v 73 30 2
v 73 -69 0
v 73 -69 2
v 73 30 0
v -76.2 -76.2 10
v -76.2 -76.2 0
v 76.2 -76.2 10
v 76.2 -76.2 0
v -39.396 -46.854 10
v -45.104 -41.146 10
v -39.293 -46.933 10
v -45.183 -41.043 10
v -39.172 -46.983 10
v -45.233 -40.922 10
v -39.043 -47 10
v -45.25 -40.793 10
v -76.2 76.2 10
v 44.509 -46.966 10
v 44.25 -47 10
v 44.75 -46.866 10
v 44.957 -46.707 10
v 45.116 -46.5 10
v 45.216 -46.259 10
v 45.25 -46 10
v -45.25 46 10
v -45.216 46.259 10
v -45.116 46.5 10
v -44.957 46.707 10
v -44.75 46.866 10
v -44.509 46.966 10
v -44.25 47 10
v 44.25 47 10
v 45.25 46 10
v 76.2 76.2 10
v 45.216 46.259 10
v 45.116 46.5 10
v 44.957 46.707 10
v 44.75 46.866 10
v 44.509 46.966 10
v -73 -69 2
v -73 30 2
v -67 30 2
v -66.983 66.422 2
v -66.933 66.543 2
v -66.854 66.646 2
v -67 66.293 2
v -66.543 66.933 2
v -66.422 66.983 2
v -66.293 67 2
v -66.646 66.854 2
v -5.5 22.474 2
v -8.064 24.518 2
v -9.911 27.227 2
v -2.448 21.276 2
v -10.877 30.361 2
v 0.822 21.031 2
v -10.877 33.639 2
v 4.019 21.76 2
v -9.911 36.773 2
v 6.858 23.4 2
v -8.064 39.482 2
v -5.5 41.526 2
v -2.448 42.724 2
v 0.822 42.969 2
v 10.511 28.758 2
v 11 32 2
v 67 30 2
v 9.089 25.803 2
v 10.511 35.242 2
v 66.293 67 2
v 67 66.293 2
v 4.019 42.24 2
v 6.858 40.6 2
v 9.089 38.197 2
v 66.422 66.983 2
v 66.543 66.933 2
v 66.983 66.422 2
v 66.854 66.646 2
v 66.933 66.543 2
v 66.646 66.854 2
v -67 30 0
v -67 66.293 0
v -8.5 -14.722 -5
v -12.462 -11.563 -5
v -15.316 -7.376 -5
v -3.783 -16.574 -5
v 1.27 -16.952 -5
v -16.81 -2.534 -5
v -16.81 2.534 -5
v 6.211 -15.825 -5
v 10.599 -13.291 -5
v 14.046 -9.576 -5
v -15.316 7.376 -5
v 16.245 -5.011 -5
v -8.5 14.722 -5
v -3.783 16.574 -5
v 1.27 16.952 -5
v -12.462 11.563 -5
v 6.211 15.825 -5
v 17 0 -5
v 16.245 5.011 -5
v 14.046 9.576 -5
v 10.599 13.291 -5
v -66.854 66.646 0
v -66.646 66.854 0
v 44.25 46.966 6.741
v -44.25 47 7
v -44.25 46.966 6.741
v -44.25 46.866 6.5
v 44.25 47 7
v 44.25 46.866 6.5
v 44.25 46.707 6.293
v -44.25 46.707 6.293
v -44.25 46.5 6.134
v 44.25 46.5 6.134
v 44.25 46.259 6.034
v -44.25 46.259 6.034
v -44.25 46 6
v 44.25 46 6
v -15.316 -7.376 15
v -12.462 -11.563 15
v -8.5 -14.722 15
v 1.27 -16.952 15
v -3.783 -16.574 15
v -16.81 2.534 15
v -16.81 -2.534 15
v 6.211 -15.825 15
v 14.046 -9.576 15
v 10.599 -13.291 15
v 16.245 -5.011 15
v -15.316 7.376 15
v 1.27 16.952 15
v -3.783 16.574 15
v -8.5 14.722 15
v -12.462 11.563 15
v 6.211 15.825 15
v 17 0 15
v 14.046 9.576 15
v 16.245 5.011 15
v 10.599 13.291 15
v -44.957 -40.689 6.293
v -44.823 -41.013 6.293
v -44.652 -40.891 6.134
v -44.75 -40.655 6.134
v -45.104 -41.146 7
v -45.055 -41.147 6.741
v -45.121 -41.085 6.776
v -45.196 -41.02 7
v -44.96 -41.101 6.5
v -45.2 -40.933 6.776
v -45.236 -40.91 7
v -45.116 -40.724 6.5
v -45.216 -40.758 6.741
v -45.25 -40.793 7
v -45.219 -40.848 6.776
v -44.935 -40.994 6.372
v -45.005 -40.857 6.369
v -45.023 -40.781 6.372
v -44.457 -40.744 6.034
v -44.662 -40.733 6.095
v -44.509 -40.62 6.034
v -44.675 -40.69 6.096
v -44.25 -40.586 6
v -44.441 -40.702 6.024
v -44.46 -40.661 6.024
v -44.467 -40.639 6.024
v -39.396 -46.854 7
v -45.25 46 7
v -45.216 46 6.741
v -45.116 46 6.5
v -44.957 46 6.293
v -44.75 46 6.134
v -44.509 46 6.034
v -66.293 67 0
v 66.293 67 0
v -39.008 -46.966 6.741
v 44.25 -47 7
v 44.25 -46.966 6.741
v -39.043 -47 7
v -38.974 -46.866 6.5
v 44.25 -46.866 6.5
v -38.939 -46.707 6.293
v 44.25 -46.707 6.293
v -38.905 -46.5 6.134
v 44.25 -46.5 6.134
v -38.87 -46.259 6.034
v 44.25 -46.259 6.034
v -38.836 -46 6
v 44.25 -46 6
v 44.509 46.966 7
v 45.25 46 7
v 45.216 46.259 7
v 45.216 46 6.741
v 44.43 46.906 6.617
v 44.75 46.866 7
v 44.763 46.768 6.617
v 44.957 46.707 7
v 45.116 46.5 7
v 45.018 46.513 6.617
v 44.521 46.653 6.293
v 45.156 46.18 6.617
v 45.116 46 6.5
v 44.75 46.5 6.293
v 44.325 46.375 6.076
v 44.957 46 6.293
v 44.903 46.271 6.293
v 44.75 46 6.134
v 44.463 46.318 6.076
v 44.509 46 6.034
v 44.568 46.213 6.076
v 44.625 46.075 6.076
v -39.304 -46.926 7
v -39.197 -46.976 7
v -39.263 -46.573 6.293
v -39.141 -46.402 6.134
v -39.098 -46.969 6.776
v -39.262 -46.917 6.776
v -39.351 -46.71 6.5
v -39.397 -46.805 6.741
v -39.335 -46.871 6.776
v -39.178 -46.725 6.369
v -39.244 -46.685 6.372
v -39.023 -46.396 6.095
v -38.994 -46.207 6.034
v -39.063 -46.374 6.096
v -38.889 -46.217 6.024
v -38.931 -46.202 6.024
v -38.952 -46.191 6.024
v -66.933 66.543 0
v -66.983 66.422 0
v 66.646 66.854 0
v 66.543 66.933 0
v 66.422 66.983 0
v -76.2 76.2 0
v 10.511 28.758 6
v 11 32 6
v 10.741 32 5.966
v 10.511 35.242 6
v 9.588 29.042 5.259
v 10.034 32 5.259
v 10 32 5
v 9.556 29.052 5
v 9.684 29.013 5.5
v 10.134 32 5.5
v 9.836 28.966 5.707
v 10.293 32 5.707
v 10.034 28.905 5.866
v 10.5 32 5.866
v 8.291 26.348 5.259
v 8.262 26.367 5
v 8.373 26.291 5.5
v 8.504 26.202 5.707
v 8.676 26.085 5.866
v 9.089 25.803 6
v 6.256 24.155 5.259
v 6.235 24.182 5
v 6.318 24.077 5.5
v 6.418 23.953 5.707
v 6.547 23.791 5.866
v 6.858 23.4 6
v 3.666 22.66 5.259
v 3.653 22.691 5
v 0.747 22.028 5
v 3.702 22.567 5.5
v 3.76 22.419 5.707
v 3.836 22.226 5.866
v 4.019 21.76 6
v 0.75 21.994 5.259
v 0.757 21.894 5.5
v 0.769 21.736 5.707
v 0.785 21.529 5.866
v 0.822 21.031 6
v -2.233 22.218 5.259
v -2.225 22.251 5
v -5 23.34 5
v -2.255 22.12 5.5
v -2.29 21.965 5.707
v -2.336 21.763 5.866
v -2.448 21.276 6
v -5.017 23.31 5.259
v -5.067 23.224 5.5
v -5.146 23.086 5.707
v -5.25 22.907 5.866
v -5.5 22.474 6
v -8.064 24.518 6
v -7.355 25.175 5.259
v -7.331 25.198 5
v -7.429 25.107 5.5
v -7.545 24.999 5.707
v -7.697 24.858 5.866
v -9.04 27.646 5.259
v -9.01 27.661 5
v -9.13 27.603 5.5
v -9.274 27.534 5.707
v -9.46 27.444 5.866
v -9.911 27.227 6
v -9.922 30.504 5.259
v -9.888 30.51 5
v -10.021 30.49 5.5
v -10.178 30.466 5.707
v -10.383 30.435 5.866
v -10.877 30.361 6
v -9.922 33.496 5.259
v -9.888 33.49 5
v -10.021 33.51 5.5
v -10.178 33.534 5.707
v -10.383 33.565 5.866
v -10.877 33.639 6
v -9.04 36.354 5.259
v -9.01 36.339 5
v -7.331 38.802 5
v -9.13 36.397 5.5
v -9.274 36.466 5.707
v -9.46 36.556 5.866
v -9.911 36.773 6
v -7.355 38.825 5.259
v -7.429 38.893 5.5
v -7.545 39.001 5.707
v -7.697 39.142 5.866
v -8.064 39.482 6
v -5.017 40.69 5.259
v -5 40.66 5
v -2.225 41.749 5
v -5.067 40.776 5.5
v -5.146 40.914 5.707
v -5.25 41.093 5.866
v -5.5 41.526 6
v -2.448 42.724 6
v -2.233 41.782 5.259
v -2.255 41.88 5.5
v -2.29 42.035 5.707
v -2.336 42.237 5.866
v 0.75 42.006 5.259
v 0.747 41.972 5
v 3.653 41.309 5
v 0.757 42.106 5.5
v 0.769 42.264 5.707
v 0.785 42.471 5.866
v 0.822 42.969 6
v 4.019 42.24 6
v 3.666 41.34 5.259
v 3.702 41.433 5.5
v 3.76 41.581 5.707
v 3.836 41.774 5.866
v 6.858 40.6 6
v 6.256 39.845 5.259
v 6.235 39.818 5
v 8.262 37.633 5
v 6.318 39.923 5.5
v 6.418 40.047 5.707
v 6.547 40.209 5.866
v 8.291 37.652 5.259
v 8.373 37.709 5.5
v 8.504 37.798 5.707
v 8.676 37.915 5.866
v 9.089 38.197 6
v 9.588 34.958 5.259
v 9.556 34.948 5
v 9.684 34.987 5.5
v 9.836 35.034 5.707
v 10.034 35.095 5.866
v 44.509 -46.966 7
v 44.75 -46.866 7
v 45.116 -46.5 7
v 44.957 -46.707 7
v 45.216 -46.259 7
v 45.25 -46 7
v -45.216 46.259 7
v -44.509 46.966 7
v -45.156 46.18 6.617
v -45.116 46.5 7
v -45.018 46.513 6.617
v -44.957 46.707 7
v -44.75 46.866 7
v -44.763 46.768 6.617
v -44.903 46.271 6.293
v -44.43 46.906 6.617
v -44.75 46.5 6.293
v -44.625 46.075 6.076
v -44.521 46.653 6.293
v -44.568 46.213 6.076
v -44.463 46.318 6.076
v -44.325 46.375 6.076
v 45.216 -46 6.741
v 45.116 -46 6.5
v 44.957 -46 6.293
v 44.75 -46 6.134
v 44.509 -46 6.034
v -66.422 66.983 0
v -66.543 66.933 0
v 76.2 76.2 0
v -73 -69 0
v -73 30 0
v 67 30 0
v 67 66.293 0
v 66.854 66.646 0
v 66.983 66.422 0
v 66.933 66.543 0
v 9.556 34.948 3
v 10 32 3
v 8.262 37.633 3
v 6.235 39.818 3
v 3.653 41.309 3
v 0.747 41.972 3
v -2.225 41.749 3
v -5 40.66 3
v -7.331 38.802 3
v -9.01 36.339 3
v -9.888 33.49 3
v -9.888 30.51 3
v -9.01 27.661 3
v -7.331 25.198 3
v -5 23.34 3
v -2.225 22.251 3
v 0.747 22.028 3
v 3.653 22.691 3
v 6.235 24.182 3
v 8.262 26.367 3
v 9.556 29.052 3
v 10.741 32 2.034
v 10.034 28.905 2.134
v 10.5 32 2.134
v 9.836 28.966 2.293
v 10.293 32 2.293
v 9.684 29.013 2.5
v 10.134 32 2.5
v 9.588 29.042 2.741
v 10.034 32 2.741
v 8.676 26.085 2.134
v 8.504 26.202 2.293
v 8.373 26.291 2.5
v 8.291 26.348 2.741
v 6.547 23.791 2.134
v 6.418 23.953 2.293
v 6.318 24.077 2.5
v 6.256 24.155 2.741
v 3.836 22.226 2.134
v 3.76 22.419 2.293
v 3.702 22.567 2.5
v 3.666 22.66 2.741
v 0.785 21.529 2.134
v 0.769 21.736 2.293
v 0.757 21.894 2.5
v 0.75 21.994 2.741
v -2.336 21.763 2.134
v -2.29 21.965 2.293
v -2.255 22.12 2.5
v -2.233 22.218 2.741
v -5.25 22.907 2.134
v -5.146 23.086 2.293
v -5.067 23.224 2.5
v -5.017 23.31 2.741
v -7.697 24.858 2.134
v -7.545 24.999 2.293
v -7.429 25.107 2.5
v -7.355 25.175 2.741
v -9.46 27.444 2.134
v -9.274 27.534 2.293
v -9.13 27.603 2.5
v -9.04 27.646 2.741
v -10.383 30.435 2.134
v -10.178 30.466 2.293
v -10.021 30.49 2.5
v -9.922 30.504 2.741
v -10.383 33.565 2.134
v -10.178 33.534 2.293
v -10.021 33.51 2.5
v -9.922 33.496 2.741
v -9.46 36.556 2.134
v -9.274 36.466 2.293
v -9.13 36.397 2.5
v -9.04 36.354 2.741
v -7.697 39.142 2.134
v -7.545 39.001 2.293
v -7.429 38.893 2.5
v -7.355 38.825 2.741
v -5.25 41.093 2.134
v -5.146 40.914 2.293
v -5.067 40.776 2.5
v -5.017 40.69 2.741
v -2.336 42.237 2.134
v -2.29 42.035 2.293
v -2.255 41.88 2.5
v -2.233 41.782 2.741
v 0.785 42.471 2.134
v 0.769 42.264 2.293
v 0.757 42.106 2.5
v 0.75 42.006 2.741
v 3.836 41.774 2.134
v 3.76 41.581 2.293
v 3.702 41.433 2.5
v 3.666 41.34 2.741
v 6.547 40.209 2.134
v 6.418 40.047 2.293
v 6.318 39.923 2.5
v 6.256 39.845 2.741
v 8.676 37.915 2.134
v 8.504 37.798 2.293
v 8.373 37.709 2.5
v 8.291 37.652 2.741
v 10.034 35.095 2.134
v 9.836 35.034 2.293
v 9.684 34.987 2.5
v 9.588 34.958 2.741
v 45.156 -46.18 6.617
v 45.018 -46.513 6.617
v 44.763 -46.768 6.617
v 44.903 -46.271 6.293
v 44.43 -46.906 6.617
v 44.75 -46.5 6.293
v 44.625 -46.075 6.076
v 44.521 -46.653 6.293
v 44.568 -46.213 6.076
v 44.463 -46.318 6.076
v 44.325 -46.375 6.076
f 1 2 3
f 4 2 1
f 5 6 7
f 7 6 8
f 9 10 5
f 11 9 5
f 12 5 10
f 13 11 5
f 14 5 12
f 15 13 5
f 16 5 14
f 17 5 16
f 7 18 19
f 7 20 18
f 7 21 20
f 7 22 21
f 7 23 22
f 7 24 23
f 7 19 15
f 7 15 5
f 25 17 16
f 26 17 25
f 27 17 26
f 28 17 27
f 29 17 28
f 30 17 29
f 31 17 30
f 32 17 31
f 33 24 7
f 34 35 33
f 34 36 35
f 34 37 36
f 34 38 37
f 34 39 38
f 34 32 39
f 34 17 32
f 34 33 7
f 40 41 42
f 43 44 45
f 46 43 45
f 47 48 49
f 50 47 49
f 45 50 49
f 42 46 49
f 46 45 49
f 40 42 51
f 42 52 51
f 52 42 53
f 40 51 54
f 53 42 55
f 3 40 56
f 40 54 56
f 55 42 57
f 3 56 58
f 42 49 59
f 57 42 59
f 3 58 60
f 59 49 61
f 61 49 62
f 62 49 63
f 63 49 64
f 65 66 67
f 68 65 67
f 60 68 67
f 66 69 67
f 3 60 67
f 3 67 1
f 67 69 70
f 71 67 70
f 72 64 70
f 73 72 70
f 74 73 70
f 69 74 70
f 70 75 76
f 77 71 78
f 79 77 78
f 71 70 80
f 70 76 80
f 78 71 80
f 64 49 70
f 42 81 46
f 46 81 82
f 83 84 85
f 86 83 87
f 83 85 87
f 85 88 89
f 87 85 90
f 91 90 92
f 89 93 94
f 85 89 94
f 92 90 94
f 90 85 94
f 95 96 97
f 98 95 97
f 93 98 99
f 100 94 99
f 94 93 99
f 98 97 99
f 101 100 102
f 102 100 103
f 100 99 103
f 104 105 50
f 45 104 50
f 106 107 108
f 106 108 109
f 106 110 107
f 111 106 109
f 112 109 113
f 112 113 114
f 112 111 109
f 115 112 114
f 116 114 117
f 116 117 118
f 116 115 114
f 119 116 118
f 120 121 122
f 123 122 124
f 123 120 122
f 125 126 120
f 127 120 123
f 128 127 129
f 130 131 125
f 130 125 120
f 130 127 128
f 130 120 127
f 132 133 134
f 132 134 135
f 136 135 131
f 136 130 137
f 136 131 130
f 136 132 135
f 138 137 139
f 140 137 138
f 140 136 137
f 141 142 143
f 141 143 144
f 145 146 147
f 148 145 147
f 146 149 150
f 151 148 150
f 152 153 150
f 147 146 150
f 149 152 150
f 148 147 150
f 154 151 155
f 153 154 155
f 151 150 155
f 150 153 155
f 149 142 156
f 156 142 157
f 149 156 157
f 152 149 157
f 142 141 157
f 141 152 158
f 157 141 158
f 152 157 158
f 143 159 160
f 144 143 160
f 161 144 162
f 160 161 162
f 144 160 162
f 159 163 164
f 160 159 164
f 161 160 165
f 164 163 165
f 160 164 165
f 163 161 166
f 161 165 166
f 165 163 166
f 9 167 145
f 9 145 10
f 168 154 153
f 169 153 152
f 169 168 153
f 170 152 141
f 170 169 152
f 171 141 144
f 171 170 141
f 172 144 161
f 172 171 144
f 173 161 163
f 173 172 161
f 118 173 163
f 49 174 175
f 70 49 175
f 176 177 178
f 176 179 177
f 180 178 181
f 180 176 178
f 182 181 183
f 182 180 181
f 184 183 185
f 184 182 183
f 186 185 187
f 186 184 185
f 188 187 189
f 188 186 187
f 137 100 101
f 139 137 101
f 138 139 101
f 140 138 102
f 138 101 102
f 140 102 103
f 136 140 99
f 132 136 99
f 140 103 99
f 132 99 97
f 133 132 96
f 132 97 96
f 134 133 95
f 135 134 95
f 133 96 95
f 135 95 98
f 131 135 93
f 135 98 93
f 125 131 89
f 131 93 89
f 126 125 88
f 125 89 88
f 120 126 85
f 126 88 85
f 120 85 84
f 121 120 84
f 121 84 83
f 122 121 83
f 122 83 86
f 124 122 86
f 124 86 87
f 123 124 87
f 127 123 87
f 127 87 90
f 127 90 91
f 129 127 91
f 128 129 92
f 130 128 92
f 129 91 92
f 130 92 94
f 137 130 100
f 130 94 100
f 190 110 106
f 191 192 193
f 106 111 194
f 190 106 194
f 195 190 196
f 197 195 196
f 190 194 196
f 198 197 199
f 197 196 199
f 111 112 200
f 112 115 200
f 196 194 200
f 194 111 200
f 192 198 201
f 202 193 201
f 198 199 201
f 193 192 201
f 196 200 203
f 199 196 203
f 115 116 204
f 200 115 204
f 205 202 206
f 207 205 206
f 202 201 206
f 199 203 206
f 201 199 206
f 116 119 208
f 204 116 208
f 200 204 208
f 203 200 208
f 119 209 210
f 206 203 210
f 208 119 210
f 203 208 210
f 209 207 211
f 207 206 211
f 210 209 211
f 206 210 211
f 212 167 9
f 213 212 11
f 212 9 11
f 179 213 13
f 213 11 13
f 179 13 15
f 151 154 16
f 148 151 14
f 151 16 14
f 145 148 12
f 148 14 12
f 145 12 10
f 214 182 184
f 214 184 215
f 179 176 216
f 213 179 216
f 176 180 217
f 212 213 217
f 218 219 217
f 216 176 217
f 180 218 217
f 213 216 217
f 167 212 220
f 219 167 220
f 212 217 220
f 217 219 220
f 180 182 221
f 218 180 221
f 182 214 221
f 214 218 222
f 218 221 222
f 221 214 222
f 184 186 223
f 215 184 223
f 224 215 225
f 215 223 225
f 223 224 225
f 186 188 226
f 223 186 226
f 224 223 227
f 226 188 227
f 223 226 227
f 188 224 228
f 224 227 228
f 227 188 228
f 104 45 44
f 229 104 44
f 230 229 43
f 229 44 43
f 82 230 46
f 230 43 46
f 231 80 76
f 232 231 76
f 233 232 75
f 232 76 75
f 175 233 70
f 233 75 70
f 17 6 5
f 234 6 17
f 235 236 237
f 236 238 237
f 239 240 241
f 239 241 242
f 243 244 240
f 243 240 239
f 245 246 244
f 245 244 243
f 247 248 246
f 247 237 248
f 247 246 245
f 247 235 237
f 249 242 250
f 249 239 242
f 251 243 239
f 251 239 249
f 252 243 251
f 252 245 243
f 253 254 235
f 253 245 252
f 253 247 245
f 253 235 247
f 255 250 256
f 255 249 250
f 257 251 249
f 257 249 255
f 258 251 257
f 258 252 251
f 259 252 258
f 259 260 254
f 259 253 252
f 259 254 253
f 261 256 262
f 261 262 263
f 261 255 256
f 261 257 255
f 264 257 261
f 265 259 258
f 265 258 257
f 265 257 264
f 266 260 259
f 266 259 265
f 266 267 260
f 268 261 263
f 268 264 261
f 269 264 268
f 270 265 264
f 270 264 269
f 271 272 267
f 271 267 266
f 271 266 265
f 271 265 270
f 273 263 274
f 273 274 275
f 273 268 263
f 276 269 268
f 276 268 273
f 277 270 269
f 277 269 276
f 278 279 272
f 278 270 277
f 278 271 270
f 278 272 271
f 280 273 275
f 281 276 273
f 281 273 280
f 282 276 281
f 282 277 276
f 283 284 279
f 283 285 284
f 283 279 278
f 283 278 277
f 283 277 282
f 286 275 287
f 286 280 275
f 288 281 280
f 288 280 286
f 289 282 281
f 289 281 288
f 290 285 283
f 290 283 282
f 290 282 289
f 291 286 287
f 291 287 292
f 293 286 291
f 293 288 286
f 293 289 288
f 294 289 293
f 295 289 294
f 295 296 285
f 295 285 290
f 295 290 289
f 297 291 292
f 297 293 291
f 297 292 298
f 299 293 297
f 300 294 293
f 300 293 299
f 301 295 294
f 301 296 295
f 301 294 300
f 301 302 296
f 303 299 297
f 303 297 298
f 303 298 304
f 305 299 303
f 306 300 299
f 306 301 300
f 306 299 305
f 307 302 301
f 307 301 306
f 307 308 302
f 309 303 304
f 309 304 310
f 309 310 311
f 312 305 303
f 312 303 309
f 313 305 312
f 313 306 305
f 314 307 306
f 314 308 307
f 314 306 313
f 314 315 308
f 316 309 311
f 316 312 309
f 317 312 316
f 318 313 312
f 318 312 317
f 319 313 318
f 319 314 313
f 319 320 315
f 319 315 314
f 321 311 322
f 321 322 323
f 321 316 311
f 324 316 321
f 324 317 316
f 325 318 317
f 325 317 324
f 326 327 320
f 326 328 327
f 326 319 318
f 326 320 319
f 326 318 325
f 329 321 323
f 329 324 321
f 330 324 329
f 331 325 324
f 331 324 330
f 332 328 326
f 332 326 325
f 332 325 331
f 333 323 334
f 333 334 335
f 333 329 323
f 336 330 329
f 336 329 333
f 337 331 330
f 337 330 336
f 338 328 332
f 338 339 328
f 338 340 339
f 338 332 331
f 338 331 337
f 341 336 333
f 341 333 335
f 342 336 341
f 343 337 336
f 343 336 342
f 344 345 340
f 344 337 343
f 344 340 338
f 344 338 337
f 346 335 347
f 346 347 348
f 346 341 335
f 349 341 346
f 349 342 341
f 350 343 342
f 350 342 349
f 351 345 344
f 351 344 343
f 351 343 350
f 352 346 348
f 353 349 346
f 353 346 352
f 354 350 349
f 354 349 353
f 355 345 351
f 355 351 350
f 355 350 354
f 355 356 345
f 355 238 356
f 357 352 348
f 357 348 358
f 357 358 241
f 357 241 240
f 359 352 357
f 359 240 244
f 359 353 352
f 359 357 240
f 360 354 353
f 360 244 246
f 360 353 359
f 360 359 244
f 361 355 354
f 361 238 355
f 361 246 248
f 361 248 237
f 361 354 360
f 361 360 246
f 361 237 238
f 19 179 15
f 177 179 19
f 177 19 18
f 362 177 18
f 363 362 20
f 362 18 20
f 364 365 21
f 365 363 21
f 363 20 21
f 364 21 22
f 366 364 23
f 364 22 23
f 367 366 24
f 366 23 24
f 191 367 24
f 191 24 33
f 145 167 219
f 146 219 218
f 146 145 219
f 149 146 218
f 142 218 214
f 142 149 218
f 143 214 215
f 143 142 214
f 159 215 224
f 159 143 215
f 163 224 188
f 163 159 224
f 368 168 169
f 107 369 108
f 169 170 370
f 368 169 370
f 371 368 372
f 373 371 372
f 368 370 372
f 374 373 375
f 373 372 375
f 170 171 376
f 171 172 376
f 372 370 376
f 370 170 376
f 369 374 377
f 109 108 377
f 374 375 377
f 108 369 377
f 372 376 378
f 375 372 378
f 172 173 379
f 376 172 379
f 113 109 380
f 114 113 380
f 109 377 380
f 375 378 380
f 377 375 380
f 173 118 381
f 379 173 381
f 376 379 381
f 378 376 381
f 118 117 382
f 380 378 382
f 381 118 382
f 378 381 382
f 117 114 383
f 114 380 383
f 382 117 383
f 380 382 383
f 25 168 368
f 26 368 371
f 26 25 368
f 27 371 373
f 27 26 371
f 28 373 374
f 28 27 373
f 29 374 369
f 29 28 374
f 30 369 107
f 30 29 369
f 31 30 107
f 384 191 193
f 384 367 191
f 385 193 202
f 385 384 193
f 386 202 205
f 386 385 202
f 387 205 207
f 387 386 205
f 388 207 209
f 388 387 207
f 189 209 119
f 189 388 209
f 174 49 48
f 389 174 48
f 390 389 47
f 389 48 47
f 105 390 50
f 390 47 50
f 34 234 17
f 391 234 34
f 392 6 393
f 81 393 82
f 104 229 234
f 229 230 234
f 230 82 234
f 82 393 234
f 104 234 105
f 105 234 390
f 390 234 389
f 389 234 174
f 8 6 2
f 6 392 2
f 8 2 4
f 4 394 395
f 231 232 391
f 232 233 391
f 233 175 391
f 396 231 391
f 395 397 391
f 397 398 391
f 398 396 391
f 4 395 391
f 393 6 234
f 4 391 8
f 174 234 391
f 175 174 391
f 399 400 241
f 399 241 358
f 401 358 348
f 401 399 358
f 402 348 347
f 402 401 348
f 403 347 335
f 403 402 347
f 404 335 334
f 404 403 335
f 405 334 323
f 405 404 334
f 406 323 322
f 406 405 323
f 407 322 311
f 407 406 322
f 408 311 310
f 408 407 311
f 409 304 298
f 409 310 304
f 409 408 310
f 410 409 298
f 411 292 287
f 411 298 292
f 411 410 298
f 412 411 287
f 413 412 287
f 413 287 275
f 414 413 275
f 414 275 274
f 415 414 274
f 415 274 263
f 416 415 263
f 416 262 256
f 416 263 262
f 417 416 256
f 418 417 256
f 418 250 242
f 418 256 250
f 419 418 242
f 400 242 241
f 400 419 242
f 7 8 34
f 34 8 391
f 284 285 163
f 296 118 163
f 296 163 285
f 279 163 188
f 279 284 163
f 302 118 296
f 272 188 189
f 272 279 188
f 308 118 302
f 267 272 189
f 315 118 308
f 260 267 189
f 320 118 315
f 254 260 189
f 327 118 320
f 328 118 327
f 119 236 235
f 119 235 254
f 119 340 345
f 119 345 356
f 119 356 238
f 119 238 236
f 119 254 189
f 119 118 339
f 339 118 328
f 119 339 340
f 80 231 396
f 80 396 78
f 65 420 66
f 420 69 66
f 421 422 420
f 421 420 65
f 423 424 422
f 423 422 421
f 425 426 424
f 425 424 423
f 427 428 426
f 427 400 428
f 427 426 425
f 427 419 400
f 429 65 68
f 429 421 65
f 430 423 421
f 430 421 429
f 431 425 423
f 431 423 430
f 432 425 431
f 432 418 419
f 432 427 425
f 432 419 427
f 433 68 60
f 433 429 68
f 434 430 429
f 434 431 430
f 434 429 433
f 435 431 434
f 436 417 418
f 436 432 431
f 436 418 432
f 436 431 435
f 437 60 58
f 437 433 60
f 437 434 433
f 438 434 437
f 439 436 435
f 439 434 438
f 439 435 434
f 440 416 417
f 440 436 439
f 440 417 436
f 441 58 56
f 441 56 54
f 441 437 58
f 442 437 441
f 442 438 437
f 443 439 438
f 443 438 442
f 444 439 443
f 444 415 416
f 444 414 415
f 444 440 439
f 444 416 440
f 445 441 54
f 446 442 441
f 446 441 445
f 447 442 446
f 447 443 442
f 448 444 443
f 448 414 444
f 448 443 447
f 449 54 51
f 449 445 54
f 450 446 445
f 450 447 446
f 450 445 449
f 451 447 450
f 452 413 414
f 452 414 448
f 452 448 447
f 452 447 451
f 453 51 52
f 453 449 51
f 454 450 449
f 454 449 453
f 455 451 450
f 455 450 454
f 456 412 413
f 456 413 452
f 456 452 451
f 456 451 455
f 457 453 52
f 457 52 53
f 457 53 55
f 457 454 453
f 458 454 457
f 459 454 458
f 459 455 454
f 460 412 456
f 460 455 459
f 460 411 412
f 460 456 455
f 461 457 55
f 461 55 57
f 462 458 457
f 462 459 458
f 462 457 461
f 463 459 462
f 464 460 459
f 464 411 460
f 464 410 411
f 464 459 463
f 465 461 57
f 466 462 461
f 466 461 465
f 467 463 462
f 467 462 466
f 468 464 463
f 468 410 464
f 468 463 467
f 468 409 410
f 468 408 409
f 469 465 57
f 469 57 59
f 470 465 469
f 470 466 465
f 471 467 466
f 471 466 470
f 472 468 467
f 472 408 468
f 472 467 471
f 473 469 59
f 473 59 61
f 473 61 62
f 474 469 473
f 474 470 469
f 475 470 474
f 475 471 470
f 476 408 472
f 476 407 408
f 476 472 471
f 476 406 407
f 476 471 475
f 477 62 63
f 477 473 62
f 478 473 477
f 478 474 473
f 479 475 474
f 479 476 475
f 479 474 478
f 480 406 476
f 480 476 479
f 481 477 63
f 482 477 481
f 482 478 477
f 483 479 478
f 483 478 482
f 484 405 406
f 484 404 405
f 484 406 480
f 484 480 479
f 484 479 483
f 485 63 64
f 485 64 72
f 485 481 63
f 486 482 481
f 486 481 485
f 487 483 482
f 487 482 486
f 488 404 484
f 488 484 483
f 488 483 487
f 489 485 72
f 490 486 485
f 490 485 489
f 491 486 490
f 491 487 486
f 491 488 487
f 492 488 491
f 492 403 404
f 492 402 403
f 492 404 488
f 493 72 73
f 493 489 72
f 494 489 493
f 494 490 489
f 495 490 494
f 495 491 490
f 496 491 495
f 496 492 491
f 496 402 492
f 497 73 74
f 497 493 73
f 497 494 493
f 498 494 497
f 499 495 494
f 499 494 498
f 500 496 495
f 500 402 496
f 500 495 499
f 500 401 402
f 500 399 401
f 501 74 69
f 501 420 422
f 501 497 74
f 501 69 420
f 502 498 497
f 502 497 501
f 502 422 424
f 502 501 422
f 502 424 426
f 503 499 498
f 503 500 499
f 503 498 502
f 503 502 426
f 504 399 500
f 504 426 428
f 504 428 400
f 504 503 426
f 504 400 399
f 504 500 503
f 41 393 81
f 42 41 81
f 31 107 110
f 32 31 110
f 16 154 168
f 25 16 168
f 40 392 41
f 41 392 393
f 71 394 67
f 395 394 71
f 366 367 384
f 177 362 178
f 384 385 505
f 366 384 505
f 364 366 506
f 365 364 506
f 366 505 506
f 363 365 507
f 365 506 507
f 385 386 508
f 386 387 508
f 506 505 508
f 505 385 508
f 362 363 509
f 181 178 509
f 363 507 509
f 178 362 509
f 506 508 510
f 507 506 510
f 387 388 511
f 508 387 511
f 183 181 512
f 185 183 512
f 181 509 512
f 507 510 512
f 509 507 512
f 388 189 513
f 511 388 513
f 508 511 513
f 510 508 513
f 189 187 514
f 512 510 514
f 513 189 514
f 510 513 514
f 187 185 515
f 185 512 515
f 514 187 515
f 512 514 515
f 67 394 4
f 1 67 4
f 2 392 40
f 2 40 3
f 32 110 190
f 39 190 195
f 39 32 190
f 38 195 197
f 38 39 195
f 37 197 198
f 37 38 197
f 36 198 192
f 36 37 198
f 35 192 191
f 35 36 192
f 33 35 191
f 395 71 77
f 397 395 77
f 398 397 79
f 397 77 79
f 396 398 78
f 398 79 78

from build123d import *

# Parameters (mm, degrees)
BOX001_W          = 90.5
BOX001_H          = 94
BOX001_DEPTH      = 8
CHAMFER_SIZE      = 6
FILLET_R          = 1
FILLET001_R       = 0.5
FILLET002_R       = 1
BOX002_W          = 134
BOX002_H          = 134
BOX002_DEPTH      = 4
CHAMFER001_SIZE   = 0.5
FILLET003_R       = 0.5
FILLET004_R       = 0.5
FILLET005_R       = 0.5
FILLET006_R       = 0.5
BOX003_W          = 146
BOX003_H          = 99
BOX003_DEPTH      = 4
CYLINDER_R        = 10
CYLINDER_DEPTH    = 20
BOX_W             = 152.4
BOX_H             = 152.4
BOX_DEPTH         = 10
FILLET007_R       = 1
CYLINDER001_R     = 17
CYLINDER001_DEPTH = 20


with BuildPart() as body:
    # Box001 → Box001 (join)
    with BuildSketch(Plane(origin=(-45.25, -47, 6), x_dir=(1, 0, 0), z_dir=(0, 0, 1))):
        with Locations((45.25, 47)):
            Rectangle(BOX001_W, BOX001_H)
    extrude(amount=BOX001_DEPTH)

    # Chamfer
    chamfer_edges = [body.edges().sort_by_distance(p)[0] for p in [
        (-45.25, -47, 10),
    ]]
    chamfer(chamfer_edges, length=CHAMFER_SIZE)

    # Fillet
    fillet_edges = [body.edges().sort_by_distance(p)[0] for p in [
        (45.25, 47, 10),
        (-45.25, 47, 10),
        (45.25, -47, 10),
    ]]
    fillet(fillet_edges, radius=FILLET_R)

    # Fillet001
    fillet001_edges = [body.edges().sort_by_distance(p)[0] for p in [
        (-45.25, -41, 10),
        (-39.25, -47, 10),
    ]]
    fillet(fillet001_edges, radius=FILLET001_R)

    # Fillet002
    fillet002_edges = [body.edges().sort_by_distance(p)[0] for p in [
        (-45.25, 2.603553, 6),
        (-45.21194, -40.984235, 6),
        (-42.25, -44, 6),
        (2.603553, -47, 6),
        (-39.234235, -46.96194, 6),
        (44.957107, -46.707107, 6),
        (45.25, 0, 6),
        (44.957107, 46.707107, 6),
        (0, 47, 6),
        (-44.957107, 46.707107, 6),
    ]]
    fillet(fillet002_edges, radius=FILLET002_R)


with BuildPart() as body002:
    # Box002 → Box002 (join)
    with BuildSketch(Plane(origin=(-67, -67, -2), x_dir=(1, 0, 0), z_dir=(0, 0, 1))):
        with Locations((67, 67)):
            Rectangle(BOX002_W, BOX002_H)
    extrude(amount=BOX002_DEPTH)

    # Chamfer001
    chamfer001_edges = [body002.edges().sort_by_distance(p)[0] for p in [
        (-67, -67, 0),
        (-67, 67, 0),
        (67, 67, 0),
        (67, -67, 0),
    ]]
    chamfer(chamfer001_edges, length=CHAMFER001_SIZE)

    # Fillet003
    fillet003_edges = [body002.edges().sort_by_distance(p)[0] for p in [
        (-66.5, -67, 0),
        (-67, -66.5, 0),
    ]]
    fillet(fillet003_edges, radius=FILLET003_R)

    # Fillet004
    fillet004_edges = [body002.edges().sort_by_distance(p)[0] for p in [
        (67, -66.5, 0),
        (66.5, -67, 0),
    ]]
    fillet(fillet004_edges, radius=FILLET004_R)

    # Fillet005
    fillet005_edges = [body002.edges().sort_by_distance(p)[0] for p in [
        (67, 66.5, 0),
        (66.5, 67, 0),
    ]]
    fillet(fillet005_edges, radius=FILLET005_R)

    # Fillet006
    fillet006_edges = [body002.edges().sort_by_distance(p)[0] for p in [
        (-67, 66.5, 0),
        (-66.5, 67, 0),
    ]]
    fillet(fillet006_edges, radius=FILLET006_R)


with BuildPart() as body003:
    # Box003 → Box003 (join)
    with BuildSketch(Plane(origin=(-73, -69, -2), x_dir=(1, 0, 0), z_dir=(0, 0, 1))):
        with Locations((73, 49.5)):
            Rectangle(BOX003_W, BOX003_H)
    extrude(amount=BOX003_DEPTH)


with BuildPart() as body004:
    # Cylinder → Cylinder (join)
    with BuildSketch(Plane(origin=(0, 32, -5), x_dir=(1, 0, 0), z_dir=(0, 0, 1))):
        Circle(CYLINDER_R)
    extrude(amount=CYLINDER_DEPTH)


with BuildPart() as base:
    # Box → Box (join)
    with BuildSketch(Plane(origin=(-76.2, -76.2, 0), x_dir=(1, 0, 0), z_dir=(0, 0, 1))):
        with Locations((76.2, 76.2)):
            Rectangle(BOX_W, BOX_H)
    extrude(amount=BOX_DEPTH)

    # Boolean: cut Body
    add(body.part, mode=Mode.SUBTRACT)

    # Boolean001: cut Body002, Body003, Body004
    add(body002.part, mode=Mode.SUBTRACT)
    add(body003.part, mode=Mode.SUBTRACT)
    add(body004.part, mode=Mode.SUBTRACT)

    # Fillet007
    fillet007_edges = [base.edges().sort_by_distance(p)[0] for p in [
        (-1.00509, 41.949362, 2),
        (0, 22, 2),
        (9.949362, 30.99491, 2),
        (10, 32, 4),
        (-10, 32, 6),
    ]]
    fillet(fillet007_edges, radius=FILLET007_R)


with BuildPart() as body005:
    # Cylinder001 → Cylinder001 (join)
    with BuildSketch(Plane.XY.offset(-5)):
        Circle(CYLINDER001_R)
    extrude(amount=CYLINDER001_DEPTH)


solid = Compound([base.part, body005.part])
